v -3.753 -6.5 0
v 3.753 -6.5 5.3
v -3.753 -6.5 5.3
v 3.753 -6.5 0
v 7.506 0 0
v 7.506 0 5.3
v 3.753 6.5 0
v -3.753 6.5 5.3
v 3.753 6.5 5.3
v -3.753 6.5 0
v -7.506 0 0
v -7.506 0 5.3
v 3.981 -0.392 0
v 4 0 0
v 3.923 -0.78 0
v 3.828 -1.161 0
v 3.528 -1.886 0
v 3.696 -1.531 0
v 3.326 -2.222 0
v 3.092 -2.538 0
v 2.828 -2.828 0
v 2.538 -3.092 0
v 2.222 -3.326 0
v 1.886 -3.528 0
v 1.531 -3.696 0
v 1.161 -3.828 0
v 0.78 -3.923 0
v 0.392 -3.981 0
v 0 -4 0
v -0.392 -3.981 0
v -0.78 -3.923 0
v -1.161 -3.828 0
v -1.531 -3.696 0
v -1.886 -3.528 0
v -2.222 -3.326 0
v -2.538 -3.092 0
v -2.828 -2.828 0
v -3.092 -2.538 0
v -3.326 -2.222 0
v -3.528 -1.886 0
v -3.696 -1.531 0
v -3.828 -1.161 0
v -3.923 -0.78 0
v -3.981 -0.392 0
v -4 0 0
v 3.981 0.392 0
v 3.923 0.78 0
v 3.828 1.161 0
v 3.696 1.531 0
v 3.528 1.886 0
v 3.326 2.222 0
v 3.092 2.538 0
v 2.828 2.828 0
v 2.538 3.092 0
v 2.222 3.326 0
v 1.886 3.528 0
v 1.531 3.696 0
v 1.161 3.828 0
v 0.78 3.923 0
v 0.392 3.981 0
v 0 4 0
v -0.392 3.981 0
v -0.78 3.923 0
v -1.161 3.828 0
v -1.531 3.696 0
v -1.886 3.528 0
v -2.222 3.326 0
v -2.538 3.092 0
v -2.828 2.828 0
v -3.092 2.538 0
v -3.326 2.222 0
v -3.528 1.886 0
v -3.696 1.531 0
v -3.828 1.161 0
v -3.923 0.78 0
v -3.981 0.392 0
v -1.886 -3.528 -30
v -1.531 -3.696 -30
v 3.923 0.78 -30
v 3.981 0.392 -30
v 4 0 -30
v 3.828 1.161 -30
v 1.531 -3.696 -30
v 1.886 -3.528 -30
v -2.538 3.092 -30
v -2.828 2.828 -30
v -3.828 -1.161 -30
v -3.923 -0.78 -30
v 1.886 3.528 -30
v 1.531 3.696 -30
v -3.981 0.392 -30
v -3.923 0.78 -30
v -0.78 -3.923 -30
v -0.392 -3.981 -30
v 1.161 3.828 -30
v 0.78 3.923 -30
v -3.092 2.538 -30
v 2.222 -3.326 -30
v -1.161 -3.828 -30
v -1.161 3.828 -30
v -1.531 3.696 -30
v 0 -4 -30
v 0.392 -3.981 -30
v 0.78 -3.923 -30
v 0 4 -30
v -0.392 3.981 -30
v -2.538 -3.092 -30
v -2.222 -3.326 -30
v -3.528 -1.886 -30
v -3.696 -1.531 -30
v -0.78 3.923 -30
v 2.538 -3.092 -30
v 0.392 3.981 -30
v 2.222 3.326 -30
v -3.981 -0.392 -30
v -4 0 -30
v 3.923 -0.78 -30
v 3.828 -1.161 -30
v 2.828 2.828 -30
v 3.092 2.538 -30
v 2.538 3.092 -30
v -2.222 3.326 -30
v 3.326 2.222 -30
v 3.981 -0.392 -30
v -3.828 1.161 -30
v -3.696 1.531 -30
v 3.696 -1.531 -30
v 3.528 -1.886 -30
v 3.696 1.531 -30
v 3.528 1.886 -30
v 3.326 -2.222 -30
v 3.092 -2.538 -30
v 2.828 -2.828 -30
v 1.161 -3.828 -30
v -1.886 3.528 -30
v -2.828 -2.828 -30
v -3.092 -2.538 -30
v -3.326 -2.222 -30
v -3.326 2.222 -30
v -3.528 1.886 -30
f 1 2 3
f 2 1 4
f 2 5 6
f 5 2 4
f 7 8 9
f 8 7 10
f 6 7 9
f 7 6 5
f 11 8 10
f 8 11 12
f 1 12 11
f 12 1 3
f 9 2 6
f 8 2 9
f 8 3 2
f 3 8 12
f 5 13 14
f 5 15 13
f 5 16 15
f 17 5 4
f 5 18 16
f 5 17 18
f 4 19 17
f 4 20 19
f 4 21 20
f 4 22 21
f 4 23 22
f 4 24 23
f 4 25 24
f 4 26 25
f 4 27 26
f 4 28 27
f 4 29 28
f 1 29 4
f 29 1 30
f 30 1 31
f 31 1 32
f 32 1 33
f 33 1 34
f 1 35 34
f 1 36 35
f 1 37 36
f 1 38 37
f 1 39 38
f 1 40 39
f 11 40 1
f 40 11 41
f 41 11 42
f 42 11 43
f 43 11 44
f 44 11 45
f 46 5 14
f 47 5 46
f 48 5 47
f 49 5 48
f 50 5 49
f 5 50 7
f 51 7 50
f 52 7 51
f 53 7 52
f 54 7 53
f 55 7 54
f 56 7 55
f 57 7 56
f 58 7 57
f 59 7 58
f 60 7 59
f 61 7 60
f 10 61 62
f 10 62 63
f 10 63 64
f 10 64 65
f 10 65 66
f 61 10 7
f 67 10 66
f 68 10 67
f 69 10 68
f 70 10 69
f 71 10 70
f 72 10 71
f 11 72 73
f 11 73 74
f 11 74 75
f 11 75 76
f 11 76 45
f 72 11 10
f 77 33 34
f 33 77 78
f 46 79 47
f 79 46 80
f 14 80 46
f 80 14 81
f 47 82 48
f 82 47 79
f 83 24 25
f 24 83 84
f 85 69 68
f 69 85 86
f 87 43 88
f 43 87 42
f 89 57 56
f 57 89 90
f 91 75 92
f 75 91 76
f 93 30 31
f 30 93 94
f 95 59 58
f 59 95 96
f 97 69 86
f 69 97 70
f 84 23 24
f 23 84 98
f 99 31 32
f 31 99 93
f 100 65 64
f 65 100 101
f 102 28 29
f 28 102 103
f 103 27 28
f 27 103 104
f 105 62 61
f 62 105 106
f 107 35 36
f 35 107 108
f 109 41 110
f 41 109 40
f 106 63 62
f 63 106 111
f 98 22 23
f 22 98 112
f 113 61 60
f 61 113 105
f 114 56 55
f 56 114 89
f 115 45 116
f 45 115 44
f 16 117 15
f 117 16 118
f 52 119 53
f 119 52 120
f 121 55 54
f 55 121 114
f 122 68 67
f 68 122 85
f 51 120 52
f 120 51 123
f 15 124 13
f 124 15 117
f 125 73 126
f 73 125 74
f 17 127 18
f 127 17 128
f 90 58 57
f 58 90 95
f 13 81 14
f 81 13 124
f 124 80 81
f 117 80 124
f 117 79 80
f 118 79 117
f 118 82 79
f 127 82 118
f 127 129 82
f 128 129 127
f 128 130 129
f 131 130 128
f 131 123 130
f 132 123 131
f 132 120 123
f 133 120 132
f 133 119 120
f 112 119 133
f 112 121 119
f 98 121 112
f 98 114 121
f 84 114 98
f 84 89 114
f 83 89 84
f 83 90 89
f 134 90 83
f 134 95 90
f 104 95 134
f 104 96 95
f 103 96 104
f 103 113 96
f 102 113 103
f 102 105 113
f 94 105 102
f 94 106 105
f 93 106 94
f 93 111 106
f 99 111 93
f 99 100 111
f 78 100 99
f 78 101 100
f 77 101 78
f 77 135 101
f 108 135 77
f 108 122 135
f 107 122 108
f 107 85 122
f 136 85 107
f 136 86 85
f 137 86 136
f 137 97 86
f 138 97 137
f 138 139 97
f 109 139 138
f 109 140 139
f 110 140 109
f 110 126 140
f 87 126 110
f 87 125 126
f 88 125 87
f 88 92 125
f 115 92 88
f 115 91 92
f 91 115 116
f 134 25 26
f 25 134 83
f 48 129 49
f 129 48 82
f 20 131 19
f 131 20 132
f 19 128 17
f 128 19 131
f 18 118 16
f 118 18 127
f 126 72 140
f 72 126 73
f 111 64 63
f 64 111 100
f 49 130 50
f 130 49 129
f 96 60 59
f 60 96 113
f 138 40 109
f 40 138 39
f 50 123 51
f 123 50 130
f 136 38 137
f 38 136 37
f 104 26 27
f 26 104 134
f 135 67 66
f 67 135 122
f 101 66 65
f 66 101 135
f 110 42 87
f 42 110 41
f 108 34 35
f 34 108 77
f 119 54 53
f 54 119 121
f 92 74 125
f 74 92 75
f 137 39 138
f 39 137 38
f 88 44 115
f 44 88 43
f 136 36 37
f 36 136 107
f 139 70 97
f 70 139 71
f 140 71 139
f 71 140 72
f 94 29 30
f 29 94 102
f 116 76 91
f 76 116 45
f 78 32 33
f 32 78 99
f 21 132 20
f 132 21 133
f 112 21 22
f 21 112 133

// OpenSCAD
// M8 六角ボルト(ねじ山省略・簡易モデル)
// 頭部底面が z=0、シャンクは z<0 側へ伸びる

af      = 13;    // 頭部 対辺距離 (across-flats) [mm]
head_h  = 5.3;   // 頭部 高さ [mm]
shank_d = 8;     // シャンク 直径 [mm]
shank_l = 30;    // シャンク 長さ [mm]

$fn = 64;        // 円柱の滑らかさ

module hex_bolt() {
    // 頭部:六角柱(対辺距離から外接円半径を算出)
    cylinder(h = head_h, r = af / 2 / cos(30), $fn = 6);

    // シャンク:円柱(z = -shank_l から z = 0 まで)
    translate([0, 0, -shank_l])
        cylinder(h = shank_l, d = shank_d);
}

hex_bolt();
